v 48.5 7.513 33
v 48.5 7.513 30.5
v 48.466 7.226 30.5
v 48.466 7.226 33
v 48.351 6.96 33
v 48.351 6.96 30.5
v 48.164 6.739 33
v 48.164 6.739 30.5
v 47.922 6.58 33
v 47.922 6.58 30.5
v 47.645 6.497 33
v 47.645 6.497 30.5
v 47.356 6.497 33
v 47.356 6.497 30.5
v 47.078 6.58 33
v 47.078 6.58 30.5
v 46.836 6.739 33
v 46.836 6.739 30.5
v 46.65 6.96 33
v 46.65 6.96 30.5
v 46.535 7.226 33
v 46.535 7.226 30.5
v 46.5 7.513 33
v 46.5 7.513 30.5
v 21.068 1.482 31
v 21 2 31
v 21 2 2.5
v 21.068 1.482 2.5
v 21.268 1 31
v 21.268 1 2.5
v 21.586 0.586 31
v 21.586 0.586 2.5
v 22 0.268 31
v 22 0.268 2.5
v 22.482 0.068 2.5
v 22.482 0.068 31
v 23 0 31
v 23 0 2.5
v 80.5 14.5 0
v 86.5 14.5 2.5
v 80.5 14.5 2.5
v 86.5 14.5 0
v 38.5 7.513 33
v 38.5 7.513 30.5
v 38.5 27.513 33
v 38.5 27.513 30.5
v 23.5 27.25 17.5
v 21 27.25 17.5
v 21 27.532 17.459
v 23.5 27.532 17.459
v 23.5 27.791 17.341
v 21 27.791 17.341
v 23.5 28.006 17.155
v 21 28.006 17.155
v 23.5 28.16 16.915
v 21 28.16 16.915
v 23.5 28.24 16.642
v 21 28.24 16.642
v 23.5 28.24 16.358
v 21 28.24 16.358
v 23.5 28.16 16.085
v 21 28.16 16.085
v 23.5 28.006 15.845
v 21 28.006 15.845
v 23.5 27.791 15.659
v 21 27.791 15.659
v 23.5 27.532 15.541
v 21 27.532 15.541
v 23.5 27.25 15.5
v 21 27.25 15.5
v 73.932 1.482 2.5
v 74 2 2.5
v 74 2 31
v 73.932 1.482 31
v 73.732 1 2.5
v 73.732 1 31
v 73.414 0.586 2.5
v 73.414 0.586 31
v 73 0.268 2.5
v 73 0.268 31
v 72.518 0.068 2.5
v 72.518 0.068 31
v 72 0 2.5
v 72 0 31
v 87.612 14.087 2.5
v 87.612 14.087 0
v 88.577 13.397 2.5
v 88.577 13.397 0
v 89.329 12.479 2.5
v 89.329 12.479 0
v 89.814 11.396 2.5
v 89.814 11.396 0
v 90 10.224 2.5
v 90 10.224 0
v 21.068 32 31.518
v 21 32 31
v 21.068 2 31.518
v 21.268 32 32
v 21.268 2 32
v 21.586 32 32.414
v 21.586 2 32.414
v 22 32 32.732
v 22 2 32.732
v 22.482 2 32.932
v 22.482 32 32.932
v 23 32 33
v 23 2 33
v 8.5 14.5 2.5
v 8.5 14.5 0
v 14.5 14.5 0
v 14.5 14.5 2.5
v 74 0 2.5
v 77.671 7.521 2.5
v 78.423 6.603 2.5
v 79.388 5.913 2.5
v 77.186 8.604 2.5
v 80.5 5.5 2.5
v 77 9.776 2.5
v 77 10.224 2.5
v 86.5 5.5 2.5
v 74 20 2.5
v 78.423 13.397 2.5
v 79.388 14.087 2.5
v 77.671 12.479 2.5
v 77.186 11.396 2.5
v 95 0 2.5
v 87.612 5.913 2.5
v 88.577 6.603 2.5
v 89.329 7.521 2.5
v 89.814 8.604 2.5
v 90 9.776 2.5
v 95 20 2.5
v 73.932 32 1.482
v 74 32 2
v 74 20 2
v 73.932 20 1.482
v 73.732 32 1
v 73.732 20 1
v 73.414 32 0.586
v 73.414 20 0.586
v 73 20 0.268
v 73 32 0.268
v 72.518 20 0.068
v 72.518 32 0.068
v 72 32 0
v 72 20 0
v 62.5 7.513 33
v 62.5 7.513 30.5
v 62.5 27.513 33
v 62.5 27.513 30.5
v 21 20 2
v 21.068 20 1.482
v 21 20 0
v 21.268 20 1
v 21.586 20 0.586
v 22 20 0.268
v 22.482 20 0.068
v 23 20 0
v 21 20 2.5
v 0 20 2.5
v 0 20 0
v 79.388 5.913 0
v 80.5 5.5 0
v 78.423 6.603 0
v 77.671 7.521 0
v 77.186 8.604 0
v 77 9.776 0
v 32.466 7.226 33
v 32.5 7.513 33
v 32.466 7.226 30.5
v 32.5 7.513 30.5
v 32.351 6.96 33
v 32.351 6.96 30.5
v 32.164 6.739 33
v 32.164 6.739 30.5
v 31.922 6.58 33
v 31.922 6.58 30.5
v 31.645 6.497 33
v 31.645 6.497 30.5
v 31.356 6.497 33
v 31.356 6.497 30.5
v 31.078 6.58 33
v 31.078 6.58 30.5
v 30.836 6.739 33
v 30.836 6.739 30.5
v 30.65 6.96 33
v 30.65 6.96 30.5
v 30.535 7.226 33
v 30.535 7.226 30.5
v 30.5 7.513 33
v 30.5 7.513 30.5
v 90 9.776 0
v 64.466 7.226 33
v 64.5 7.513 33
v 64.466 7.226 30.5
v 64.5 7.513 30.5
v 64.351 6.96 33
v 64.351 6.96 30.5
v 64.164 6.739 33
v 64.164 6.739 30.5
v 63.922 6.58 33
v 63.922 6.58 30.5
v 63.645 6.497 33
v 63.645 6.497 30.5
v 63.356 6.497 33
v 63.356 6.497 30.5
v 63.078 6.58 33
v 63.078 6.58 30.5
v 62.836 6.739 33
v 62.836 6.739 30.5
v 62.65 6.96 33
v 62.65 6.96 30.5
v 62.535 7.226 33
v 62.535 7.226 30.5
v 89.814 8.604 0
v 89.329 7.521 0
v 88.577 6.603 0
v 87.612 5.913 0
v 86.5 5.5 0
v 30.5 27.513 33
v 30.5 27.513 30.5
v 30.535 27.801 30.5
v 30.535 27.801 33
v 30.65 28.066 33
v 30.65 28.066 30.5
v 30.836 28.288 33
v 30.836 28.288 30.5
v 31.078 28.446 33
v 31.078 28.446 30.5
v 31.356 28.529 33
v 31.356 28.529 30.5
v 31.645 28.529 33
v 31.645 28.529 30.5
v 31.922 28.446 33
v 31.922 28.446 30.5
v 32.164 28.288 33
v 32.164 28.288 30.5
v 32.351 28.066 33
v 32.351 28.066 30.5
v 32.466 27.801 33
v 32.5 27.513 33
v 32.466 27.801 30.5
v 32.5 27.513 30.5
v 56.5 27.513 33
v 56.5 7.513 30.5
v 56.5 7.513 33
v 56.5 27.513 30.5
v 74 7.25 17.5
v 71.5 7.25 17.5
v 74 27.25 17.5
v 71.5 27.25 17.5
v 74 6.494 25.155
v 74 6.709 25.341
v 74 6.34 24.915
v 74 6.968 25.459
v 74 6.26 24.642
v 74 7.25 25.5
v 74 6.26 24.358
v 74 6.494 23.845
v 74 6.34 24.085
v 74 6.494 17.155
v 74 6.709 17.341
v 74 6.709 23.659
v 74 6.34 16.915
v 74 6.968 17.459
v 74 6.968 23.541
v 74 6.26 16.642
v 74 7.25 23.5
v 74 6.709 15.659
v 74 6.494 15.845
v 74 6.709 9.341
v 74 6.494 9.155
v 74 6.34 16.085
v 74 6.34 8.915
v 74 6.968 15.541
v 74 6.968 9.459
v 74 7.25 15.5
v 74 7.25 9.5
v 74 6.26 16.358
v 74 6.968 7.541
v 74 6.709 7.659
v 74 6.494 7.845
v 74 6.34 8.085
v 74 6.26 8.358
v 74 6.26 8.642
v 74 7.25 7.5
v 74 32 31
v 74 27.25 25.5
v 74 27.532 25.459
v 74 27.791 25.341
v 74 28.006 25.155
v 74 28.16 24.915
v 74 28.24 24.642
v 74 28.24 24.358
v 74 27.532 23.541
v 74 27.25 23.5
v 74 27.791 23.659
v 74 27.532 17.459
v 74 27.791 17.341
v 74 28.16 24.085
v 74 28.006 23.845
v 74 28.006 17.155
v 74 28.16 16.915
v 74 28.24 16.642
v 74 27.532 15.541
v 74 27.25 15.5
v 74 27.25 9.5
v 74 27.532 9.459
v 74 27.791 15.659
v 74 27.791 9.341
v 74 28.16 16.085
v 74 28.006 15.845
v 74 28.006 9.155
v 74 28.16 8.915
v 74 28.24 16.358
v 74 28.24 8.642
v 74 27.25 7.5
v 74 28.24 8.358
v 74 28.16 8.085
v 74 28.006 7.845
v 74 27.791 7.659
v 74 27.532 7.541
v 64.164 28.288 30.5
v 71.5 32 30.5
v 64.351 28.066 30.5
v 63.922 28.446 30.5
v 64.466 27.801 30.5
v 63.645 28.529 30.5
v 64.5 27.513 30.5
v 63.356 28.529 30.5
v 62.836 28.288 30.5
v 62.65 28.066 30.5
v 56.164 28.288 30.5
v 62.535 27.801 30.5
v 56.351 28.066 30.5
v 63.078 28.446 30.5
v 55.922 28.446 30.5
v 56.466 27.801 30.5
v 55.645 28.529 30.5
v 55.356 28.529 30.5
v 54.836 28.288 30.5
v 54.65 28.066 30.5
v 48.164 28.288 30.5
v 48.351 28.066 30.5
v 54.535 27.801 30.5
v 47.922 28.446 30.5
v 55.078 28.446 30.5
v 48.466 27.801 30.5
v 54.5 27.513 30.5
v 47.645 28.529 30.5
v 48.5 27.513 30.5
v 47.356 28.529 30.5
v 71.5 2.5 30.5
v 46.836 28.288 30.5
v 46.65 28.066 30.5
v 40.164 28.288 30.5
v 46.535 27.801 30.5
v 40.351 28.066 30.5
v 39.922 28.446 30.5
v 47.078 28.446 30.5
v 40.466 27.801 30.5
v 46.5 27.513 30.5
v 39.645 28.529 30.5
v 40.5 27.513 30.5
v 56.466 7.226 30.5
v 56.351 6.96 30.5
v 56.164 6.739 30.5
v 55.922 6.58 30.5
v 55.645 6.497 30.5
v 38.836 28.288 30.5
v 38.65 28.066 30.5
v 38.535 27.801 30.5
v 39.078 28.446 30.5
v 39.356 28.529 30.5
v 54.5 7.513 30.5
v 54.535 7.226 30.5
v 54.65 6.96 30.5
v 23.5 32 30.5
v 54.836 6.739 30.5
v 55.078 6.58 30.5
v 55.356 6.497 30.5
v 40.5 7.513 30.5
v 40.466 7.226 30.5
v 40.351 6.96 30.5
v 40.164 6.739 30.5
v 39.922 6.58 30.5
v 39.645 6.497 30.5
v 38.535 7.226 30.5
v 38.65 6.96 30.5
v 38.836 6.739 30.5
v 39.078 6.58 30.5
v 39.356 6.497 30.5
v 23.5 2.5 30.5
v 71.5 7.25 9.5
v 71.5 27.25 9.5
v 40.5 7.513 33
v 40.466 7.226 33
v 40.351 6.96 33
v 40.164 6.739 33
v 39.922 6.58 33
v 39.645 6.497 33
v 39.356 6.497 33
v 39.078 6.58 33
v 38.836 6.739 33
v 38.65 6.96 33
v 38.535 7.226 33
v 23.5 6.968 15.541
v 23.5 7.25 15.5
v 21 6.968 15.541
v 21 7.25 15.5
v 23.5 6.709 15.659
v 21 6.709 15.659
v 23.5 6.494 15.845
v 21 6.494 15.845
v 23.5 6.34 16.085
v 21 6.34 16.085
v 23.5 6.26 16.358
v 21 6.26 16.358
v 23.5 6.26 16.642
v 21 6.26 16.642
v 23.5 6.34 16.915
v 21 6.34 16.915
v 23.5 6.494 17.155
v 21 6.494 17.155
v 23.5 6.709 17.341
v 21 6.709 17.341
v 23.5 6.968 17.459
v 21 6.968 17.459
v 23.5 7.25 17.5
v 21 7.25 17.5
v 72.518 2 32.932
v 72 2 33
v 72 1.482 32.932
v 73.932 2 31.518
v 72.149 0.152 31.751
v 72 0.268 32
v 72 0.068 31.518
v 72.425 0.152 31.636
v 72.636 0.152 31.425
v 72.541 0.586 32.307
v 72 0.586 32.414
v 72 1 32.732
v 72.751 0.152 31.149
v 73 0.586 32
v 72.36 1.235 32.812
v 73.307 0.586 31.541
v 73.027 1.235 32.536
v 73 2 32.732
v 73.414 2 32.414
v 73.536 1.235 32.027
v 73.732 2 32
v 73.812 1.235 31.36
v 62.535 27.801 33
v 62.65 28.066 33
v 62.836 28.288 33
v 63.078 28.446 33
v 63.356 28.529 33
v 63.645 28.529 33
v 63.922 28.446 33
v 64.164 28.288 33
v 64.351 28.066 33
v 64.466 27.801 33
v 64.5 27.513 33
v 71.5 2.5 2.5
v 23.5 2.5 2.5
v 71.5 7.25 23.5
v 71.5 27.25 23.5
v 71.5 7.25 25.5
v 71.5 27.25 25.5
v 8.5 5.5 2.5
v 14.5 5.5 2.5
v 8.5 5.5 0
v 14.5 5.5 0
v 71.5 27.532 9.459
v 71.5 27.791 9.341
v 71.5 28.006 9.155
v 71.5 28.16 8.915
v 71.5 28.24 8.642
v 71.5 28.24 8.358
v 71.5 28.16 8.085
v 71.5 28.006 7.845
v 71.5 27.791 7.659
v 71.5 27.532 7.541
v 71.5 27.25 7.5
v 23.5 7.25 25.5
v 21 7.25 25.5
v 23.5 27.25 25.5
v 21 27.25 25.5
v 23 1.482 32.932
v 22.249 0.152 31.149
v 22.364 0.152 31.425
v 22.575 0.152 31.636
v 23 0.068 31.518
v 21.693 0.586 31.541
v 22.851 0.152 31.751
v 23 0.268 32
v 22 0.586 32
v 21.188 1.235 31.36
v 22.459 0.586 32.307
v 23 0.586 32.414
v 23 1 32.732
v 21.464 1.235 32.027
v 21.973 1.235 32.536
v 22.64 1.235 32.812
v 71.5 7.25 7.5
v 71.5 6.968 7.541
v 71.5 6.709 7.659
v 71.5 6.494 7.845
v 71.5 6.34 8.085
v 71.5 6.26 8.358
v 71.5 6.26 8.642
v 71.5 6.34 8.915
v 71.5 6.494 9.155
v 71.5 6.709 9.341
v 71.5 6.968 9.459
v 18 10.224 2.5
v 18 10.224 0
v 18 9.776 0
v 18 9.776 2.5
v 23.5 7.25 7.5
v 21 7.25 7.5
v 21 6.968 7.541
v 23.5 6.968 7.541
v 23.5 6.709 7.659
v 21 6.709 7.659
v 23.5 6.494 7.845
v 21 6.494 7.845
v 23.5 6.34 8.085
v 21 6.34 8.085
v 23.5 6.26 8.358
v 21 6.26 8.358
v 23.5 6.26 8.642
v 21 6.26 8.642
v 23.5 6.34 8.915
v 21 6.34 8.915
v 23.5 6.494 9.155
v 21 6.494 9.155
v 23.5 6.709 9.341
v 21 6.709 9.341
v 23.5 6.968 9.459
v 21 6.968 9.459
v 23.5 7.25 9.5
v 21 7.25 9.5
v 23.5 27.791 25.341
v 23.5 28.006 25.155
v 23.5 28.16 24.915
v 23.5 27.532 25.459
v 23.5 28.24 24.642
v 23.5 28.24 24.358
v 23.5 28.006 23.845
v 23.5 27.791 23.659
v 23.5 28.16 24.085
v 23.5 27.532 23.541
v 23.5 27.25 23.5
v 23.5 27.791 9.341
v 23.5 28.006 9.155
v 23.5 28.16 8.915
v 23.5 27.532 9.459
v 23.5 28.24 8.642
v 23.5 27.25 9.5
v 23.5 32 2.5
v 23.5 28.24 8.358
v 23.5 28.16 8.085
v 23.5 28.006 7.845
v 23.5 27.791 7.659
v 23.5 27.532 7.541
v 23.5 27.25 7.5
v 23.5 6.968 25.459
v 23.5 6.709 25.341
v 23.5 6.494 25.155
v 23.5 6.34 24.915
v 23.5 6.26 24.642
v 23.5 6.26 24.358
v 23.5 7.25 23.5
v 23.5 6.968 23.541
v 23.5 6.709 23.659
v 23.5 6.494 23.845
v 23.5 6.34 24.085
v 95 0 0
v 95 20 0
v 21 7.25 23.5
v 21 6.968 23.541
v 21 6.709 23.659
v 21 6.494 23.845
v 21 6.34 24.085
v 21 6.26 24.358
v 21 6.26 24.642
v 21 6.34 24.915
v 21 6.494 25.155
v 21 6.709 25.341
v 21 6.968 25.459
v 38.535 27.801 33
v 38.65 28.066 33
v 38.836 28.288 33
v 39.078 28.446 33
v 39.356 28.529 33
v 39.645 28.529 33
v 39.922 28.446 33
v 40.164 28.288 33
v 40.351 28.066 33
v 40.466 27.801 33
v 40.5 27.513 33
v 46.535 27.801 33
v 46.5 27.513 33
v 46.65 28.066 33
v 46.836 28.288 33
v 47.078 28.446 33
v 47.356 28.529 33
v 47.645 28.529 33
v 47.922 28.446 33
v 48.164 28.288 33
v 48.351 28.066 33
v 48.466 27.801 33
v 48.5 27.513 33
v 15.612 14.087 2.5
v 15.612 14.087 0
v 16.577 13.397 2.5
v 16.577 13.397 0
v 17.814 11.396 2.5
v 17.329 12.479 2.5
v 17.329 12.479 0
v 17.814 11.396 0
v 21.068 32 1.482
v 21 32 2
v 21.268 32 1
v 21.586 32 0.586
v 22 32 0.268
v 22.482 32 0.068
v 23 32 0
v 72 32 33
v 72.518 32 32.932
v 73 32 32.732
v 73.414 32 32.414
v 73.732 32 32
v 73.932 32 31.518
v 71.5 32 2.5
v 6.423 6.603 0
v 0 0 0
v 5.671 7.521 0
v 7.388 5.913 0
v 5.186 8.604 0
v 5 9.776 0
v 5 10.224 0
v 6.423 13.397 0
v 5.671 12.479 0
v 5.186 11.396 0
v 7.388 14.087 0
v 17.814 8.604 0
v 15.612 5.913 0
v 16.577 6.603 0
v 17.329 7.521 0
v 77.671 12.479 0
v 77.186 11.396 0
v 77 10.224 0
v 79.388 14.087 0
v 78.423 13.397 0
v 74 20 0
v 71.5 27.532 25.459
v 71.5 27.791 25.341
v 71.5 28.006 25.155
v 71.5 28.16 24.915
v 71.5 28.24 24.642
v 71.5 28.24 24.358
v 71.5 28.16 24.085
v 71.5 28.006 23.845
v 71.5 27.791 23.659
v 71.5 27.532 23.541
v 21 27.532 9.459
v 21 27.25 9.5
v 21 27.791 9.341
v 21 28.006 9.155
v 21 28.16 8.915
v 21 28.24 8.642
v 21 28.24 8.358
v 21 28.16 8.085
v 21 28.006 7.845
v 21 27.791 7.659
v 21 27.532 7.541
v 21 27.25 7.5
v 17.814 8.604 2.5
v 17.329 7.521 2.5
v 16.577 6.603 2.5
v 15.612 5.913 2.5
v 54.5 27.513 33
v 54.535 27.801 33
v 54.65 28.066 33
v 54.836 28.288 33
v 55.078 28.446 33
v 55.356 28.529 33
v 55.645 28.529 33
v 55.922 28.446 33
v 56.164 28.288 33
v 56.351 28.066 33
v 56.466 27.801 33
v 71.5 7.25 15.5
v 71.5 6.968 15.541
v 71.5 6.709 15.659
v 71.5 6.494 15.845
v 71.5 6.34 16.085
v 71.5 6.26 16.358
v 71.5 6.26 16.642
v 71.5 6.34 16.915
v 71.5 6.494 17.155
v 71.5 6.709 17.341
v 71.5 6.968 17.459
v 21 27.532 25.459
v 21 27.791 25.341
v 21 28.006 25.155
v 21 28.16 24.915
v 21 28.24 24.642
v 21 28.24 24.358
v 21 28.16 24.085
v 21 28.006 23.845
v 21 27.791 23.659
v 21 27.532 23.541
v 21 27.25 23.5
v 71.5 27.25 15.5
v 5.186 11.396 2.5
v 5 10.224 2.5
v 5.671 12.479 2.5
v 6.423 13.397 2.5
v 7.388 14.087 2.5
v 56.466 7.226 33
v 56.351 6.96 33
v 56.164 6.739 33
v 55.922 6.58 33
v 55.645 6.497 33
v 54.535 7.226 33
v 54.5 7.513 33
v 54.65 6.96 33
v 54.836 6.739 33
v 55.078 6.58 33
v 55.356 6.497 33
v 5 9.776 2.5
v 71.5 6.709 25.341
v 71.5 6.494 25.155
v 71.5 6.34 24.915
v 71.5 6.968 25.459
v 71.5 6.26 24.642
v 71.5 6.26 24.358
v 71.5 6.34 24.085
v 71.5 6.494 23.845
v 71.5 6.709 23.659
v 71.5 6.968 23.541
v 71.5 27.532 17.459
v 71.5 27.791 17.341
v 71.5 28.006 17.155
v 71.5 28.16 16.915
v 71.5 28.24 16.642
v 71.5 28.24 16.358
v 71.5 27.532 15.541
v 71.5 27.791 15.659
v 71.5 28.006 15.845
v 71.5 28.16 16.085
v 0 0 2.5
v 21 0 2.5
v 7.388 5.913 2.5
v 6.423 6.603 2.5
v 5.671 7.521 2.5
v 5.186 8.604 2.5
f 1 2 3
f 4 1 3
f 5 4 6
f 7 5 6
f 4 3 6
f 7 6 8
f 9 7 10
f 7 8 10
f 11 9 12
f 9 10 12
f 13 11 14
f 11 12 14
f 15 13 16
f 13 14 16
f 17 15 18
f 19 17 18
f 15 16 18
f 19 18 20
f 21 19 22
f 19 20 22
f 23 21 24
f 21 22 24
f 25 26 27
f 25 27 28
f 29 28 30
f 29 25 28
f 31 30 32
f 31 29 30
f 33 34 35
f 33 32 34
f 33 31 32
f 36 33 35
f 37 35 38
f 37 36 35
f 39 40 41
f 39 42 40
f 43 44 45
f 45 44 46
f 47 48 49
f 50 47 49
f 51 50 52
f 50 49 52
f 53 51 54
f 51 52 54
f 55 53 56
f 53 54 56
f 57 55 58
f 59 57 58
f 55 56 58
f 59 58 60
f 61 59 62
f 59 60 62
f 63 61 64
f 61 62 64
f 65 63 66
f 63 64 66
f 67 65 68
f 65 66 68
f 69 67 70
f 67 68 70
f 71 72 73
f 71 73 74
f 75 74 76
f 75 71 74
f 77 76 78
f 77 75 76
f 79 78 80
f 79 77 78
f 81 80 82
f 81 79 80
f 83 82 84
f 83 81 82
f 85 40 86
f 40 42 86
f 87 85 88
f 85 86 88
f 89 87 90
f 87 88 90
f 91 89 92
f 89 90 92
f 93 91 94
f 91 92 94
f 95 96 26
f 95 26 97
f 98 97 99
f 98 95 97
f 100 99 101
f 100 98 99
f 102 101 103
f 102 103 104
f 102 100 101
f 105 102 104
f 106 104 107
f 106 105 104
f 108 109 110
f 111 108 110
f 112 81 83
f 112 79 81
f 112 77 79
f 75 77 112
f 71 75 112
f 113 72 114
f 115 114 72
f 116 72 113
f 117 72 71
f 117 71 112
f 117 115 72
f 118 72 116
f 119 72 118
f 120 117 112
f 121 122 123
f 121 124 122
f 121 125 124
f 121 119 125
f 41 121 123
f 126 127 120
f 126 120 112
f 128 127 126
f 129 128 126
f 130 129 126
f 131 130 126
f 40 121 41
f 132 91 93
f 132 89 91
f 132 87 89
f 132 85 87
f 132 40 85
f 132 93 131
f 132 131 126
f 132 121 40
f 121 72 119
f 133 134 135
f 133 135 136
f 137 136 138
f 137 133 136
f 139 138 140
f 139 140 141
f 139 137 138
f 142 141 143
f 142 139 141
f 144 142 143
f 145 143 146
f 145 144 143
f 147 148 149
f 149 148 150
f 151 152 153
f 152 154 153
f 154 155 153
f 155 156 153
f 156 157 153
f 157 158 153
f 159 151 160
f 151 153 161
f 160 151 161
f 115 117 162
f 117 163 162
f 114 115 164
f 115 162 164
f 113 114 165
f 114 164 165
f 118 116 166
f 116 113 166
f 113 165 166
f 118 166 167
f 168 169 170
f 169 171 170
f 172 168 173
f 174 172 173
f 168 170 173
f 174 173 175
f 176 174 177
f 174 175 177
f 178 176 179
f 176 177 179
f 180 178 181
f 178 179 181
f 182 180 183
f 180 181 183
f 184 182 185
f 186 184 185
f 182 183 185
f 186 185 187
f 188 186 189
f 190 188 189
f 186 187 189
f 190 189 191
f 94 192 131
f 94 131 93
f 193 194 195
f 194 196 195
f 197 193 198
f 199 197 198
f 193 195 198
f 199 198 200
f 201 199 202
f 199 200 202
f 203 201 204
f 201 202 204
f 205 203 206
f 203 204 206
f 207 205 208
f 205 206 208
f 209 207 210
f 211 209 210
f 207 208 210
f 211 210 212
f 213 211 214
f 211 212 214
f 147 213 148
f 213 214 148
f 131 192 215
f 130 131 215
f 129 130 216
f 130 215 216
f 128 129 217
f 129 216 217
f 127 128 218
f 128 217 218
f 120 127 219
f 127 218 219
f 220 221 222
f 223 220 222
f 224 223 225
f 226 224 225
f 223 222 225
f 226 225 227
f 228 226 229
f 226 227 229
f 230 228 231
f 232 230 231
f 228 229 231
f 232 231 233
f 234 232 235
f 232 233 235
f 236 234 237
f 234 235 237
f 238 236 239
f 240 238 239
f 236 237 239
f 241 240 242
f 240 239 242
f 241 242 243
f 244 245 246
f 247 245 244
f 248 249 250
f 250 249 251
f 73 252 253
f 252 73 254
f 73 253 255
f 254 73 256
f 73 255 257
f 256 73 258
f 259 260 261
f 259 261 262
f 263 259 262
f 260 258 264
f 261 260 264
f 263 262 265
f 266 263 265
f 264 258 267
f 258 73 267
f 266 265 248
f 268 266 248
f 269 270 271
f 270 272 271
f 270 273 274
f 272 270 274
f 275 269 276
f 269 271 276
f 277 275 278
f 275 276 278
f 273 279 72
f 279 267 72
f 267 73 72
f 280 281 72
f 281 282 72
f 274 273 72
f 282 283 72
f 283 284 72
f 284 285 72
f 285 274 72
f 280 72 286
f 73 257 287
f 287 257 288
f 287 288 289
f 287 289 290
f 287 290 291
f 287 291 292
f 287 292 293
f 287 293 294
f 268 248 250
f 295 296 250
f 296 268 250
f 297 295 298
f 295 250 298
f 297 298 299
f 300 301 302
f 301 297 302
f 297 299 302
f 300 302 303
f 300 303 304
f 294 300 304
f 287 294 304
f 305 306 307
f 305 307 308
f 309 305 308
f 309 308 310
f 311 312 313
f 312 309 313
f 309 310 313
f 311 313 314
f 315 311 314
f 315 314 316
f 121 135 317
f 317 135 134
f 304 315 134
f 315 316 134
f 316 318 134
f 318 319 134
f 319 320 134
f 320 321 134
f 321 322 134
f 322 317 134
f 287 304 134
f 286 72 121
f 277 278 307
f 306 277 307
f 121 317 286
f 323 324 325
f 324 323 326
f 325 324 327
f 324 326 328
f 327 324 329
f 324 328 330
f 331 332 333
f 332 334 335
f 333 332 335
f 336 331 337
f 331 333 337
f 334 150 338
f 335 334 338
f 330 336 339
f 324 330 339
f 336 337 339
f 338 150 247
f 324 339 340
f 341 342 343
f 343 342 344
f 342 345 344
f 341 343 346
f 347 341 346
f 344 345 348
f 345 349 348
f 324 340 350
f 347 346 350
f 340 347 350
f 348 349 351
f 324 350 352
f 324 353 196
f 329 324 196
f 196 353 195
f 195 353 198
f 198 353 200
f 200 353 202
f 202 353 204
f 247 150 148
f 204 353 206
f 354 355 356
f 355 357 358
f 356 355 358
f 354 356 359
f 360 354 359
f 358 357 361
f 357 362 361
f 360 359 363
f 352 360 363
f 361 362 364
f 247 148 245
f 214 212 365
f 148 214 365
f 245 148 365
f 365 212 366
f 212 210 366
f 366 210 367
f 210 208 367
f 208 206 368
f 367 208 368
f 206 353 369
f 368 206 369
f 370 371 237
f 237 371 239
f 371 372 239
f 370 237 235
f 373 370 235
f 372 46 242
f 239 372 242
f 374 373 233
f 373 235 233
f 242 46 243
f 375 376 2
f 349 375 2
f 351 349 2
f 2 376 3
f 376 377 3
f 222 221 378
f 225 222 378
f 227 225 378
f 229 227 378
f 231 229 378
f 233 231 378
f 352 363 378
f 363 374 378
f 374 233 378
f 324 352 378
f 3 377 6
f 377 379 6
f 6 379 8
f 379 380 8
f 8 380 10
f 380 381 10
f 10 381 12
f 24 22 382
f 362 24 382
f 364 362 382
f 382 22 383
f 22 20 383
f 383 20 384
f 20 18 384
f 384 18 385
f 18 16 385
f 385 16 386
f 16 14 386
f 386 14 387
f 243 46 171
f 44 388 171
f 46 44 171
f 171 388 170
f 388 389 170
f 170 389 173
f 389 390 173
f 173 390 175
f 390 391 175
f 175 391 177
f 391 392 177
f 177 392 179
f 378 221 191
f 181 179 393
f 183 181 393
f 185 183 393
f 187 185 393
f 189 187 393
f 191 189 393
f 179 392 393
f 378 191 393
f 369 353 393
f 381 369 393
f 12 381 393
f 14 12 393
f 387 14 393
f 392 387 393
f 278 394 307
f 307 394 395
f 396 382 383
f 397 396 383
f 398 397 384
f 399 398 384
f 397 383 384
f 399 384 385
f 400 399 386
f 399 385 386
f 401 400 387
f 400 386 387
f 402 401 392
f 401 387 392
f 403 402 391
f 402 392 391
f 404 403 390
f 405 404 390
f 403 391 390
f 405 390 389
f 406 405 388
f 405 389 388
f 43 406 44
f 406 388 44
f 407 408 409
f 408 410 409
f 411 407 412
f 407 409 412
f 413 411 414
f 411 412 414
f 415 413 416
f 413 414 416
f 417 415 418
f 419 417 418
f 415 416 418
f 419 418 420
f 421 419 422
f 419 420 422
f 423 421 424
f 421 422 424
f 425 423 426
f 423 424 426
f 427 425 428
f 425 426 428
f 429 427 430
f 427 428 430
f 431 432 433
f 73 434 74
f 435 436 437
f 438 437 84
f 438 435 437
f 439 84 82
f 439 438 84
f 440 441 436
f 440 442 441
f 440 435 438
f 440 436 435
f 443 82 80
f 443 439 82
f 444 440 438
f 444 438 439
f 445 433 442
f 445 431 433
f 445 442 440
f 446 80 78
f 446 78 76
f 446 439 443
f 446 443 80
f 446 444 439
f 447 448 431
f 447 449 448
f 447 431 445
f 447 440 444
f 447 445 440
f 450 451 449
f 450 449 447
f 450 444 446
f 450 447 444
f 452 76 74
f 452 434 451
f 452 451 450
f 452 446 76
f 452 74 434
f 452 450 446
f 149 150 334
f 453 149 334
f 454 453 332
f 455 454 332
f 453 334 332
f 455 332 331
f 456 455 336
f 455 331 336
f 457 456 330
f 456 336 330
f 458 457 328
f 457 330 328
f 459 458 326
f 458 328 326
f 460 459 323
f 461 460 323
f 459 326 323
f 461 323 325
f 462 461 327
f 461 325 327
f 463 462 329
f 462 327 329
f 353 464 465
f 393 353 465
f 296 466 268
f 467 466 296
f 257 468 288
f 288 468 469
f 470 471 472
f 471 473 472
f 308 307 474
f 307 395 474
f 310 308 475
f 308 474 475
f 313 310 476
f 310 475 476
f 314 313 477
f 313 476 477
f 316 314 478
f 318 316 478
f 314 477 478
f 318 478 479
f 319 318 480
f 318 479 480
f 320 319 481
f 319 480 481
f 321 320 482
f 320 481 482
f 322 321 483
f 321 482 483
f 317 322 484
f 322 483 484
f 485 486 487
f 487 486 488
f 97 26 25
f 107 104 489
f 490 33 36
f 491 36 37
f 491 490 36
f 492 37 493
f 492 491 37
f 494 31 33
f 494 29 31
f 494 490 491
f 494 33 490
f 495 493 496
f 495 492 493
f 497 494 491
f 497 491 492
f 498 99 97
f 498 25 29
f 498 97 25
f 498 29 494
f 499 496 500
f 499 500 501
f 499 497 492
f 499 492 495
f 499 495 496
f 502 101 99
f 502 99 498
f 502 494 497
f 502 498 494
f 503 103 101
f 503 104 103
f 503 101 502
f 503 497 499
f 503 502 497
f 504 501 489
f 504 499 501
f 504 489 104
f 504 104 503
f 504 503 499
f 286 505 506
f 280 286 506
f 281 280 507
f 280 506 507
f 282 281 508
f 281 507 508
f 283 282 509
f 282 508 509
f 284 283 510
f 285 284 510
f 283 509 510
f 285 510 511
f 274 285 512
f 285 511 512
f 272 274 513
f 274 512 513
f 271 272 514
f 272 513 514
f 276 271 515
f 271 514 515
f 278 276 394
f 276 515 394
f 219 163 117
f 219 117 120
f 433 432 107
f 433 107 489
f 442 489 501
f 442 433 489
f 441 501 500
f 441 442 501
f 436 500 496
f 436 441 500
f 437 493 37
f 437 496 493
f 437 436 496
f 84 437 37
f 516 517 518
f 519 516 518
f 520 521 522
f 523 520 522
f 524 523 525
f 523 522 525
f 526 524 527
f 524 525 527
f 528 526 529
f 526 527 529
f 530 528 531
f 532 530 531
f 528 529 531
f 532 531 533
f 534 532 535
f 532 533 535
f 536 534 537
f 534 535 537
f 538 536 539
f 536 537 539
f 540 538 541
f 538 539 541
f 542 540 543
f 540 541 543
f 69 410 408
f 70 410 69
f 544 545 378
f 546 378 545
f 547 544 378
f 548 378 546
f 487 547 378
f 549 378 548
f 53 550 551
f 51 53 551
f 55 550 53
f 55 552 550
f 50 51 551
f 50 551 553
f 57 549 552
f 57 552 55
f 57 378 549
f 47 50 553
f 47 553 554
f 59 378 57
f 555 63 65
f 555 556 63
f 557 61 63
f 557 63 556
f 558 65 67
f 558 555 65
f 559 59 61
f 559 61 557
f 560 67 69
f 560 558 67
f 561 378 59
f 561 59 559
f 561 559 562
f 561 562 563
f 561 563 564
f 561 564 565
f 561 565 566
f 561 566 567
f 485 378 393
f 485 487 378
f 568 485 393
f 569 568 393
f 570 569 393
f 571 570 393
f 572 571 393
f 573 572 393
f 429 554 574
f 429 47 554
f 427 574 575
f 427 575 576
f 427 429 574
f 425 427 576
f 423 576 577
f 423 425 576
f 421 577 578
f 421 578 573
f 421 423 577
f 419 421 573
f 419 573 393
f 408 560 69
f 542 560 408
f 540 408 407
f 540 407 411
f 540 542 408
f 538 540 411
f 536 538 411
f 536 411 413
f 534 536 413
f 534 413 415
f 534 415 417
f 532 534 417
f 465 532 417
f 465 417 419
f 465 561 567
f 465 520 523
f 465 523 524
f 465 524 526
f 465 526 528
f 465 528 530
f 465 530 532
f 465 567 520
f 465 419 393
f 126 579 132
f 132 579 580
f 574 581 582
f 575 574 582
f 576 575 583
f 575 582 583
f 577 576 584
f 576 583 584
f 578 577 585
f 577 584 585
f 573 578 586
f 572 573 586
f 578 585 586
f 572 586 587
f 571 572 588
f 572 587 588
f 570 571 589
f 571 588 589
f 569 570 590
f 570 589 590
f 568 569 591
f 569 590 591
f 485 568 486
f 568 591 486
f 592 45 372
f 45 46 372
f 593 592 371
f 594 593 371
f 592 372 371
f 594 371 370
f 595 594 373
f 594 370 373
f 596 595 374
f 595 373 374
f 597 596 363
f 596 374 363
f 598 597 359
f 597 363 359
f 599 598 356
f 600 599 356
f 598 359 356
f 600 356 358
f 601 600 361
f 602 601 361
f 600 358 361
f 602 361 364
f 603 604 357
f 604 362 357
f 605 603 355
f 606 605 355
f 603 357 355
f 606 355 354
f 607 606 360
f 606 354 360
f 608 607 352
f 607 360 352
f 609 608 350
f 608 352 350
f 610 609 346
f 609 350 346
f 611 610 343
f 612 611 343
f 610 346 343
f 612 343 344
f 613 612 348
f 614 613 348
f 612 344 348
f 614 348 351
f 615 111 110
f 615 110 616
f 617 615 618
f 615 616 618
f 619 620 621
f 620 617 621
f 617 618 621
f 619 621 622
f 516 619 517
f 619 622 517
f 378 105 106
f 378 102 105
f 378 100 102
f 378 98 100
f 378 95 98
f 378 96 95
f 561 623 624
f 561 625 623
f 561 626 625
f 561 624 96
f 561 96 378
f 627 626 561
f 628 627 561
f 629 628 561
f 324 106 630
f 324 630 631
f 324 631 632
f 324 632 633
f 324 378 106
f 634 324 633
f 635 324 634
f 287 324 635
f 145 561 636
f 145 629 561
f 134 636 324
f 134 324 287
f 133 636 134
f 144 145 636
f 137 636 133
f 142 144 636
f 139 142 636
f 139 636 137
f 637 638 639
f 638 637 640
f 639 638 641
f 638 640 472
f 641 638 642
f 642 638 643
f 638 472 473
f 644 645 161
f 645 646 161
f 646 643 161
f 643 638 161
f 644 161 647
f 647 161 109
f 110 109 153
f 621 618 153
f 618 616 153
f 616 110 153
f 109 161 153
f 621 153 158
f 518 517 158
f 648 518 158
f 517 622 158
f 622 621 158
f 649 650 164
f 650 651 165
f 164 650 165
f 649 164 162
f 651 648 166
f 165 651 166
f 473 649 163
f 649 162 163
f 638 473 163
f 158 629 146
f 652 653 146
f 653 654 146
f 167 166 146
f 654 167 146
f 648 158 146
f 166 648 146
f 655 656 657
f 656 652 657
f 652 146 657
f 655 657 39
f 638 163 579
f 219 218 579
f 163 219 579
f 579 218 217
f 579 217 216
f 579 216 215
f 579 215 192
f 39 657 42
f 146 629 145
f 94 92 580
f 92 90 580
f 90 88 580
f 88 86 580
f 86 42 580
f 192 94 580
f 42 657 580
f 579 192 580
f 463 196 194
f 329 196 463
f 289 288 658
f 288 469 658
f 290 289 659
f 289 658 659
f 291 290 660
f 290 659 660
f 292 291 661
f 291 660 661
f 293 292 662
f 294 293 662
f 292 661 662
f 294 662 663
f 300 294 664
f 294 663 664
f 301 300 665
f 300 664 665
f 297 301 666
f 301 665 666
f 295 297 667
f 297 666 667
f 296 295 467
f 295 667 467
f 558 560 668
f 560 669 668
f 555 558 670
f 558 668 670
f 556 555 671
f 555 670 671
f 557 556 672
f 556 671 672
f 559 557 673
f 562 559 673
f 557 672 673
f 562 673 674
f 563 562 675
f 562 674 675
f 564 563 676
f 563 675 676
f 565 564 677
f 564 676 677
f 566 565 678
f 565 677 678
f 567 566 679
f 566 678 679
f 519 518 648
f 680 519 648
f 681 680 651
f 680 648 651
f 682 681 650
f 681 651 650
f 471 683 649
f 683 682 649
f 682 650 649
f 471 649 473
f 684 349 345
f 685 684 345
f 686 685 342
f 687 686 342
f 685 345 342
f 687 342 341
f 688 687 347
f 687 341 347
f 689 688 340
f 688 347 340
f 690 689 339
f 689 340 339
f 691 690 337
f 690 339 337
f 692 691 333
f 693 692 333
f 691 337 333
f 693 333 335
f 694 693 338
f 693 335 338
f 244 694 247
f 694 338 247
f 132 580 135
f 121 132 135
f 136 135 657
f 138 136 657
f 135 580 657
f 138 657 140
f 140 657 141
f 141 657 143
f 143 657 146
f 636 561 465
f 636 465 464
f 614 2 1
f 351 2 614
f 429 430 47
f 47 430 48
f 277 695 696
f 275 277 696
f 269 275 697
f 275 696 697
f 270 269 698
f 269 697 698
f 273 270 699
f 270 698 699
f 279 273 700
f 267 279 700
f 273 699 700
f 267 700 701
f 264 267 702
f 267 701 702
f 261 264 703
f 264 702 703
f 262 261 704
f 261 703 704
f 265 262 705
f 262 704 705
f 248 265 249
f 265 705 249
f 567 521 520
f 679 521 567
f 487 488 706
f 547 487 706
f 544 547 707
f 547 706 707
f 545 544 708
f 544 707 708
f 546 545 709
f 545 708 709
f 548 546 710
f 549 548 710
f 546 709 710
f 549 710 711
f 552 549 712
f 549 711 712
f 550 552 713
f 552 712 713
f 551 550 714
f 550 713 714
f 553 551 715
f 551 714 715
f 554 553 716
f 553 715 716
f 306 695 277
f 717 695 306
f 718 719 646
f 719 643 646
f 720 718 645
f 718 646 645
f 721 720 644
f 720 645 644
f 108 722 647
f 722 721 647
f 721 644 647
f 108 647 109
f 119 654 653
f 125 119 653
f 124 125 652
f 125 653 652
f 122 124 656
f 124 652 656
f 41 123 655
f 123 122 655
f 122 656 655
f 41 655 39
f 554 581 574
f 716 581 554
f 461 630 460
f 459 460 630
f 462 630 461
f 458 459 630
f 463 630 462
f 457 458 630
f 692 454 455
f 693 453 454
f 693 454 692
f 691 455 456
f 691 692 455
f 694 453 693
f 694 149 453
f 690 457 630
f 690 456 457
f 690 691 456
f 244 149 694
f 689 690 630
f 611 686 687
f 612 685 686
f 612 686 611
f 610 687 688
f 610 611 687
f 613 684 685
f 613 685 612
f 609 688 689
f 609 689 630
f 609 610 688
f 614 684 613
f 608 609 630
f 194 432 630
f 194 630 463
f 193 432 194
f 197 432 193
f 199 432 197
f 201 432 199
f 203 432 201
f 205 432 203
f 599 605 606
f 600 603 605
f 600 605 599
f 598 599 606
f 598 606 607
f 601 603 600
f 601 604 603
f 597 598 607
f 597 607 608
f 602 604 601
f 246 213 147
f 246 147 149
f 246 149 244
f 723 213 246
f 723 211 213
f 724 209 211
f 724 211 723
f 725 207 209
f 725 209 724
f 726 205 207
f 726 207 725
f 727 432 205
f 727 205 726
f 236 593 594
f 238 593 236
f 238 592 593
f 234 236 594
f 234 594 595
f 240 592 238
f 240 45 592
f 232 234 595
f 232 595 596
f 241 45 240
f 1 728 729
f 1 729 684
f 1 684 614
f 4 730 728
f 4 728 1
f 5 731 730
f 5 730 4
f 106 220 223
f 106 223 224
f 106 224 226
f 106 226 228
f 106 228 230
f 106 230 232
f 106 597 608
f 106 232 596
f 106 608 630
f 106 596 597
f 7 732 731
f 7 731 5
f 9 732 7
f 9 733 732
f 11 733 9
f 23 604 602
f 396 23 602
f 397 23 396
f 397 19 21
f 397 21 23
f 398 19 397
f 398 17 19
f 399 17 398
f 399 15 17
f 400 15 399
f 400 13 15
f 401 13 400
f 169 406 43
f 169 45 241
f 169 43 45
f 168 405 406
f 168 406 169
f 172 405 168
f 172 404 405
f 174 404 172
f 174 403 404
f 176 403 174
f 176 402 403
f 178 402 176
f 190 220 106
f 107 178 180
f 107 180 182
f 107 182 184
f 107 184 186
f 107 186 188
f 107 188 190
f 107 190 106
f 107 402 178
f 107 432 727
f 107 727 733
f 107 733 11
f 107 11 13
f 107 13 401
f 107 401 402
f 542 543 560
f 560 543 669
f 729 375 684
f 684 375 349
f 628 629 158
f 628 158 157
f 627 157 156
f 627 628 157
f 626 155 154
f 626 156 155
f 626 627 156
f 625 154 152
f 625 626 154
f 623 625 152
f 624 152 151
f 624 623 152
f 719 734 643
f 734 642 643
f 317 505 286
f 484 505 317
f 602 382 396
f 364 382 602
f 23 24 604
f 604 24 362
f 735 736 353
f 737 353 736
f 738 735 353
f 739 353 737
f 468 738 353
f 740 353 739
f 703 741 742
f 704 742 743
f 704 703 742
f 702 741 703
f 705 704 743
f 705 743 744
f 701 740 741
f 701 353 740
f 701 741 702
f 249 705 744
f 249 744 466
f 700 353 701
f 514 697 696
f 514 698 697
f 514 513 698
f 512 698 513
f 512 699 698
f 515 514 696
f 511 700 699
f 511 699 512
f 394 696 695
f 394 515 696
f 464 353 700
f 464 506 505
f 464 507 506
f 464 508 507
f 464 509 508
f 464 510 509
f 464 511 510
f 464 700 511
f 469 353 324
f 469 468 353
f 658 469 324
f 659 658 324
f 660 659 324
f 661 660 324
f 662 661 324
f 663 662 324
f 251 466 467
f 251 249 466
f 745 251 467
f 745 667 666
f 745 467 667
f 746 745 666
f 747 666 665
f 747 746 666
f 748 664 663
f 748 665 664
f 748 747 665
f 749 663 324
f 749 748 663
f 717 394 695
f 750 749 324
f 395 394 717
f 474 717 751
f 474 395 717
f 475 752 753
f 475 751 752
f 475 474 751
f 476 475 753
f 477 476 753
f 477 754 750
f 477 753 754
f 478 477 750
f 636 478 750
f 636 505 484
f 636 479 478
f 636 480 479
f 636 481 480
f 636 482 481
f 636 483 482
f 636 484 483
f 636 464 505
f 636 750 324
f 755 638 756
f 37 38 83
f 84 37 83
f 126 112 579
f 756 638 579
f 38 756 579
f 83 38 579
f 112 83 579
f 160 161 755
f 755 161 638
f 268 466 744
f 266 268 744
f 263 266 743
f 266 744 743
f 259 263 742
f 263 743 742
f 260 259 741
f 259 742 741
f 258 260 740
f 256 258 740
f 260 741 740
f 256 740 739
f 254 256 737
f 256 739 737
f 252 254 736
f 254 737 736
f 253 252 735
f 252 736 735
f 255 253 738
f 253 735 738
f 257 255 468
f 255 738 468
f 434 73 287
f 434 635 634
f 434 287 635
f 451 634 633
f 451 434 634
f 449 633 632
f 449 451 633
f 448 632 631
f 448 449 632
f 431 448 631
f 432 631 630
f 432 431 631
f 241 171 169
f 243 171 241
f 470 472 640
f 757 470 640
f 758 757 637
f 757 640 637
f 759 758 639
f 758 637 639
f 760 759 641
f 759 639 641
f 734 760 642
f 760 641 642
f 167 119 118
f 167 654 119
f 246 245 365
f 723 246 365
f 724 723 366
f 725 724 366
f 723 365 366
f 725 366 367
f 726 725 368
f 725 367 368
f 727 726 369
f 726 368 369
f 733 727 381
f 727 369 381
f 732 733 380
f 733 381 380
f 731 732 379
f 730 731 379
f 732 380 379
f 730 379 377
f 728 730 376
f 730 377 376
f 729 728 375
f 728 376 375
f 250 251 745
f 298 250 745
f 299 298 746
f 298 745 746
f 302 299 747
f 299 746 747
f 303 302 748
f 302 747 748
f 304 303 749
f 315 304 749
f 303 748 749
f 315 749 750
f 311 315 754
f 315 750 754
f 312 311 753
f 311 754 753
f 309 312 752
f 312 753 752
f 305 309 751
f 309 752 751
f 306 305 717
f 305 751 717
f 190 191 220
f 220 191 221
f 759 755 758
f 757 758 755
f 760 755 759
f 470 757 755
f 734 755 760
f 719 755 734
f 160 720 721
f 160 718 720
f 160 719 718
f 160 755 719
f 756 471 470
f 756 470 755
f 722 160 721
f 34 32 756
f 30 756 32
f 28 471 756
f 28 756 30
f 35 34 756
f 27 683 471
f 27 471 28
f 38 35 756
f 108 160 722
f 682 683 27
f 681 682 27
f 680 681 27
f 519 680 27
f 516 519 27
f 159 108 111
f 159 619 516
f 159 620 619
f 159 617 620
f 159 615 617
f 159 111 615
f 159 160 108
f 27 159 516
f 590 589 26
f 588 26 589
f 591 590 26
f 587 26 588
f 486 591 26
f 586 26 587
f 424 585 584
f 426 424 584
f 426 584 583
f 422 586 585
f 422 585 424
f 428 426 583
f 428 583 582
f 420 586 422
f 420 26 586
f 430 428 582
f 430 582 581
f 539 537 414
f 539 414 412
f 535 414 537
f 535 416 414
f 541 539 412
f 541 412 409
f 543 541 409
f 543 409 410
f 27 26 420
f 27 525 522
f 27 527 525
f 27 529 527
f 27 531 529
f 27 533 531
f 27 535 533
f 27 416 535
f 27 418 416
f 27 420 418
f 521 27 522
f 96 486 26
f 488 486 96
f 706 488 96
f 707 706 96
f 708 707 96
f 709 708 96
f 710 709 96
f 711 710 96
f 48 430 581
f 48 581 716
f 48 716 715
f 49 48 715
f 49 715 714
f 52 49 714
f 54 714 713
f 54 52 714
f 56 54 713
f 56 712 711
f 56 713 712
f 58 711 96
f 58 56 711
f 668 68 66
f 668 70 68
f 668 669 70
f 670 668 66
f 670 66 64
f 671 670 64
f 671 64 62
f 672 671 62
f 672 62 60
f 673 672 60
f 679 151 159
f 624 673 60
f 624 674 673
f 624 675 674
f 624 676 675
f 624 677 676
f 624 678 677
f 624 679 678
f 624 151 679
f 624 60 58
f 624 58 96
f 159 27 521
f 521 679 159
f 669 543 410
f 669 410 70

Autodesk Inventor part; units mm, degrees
ref_plane "YZ Plane" through (0, 0, 0) normal (1, 0, 0) x (0, 1, 0)
ref_plane "XZ Plane" through (0, 0, 0) normal (0, 1, 0) x (-1, 0, 0)
ref_plane "XY Plane" through (0, 0, 0) normal (0, 0, 1) x (1, 0, 0)
sketch "Sketch1" plane through (0, 0, 0) normal (0, 0, 1) x (1, 0, 0)
  line L0 (0, 0) -> (95, 0)
  line L1 (95, 0) -> (95, 20)
  line L2 (95, 20) -> (0, 20)
  line L3 (0, 20) -> (0, 0)
  line L4 (8.5, 14.5) -> (14.5, 14.5)
  line L5 (18, 10.2244) -> (18, 9.7756)
  line L6 (14.5, 5.5) -> (8.5, 5.5)
  line L7 (5, 9.7756) -> (5, 10.2244)
  line L8 (11.5, 14.5) -> (8.5, 14.5)
  arc A0 (8.5, 14.5) -> (5, 10) centre (9.4986, 10.1122) ccw
  arc A1 (5, 10) -> (8.5, 5.5) centre (9.4986, 9.8878) ccw
  arc A2 (18, 10) -> (14.5, 14.5) centre (13.5014, 10.1122) ccw
  arc A3 (14.5, 5.5) -> (18, 10) centre (13.5014, 9.8878) ccw
  line L9 (86.5, 14.5) -> (80.5, 14.5)
  line L10 (77, 10.2244) -> (77, 9.7756)
  line L11 (80.5, 5.5) -> (86.5, 5.5)
  line L12 (90, 9.7756) -> (90, 10.2244)
  line L13 (83.5, 14.5) -> (86.5, 14.5)
  arc A4 (90, 10) -> (86.5, 14.5) centre (85.5014, 10.1122) ccw
  arc A5 (86.5, 5.5) -> (90, 10) centre (85.5014, 9.8878) ccw
  arc A6 (80.5, 14.5) -> (77, 10) centre (81.4986, 10.1122) ccw
  arc A7 (77, 10) -> (80.5, 5.5) centre (81.4986, 9.8878) ccw
  point P0 (47.5, 10)
  point P1 (11.5, 10)
  point P2 (83.5, 10)
  dimension "d0" = 95
  dimension "d1" = 20
extrude "Extrusion1" add sketch "Sketch1" along normal blind 2.5
sketch "Sketch2" plane through (0, 20, 0) normal (0, 1, 0) x (1, 0, 0)
  line L0 (0, 0) -> (95, 0) projected
  line L1 (47.5, 0) -> (21, 0)
  line L2 (47.5, 0) -> (74, 0) construction
  line L3 (47.5, 0) -> (74, 0)
  line L4 (47.5, 0) -> (74, 0) construction
  line L5 (74, 0) -> (74, -2.5)
  line L6 (0, -2.5) -> (95, -2.5) projected
  line L7 (21, 0) -> (21, -2.5)
  line L8 (21, -2.5) -> (74, -2.5)
extrude "Extrusion2" add sketch "Sketch2" along normal blind 12
sketch "Sketch3" plane through (0, 0, 2.5) normal (0, 0, 1) x (1, 0, 0)
  line L0 (74, 32) -> (21, 32) projected
  line L1 (0, 0) -> (95, 0) projected
  line L2 (21, 32) -> (23.5, 32)
  line L3 (23.5, 32) -> (23.5, 2.5)
  line L4 (23.5, 0) -> (21, 0)
  line L5 (21, 0) -> (21, 32)
  line L6 (74, 20) -> (74, 32) projected
  line L7 (74, 20) -> (74, 0)
  line L8 (74, 0) -> (71.5, 0)
  line L9 (71.5, 2.5) -> (71.5, 32)
  line L10 (71.5, 32) -> (74, 32)
  line L11 (74, 32) -> (74, 0)
  line L12 (23.5, 0) -> (71.5, 0)
  line L13 (71.5, 2.5) -> (23.5, 2.5)
extrude "Extrusion3" add sketch "Sketch3" along normal blind 30.5 contours L6 L7 L1 L5 L0 L3 L13 L9
sketch "Sketch4" plane through (23.5, 2.5, 2.5) normal (0, 1, 0) x (1, 0, 0)
  line L0 (48, -30.5) -> (0, -30.5) projected
  line L1 (48, 0) -> (48, -30.5) projected
  line L2 (0, -30.5) -> (48, -30.5)
  line L3 (48, -30.5) -> (48, -28)
  line L4 (48, -28) -> (0, -28)
  line L5 (0, -28) -> (0, -30.5)
  point P0 (-23.5, 2.5)
  dimension "d24" = 2.5
extrude "Extrusion4" add sketch "Sketch4" along normal up to surface (29.5 mm away)
sketch "Sketch5" plane through (23.5, 2.5, 2.5) normal (1, 0, 0) x (0, 0, -1)
  line L0 (0, 0) -> (-28, 0) projected
  line L1 (-14, 0) -> (-14, 29.5)
  line L2 (0, 29.5) -> (-28, 29.5) projected
  line L3 (-15, 14.75) -> (-15, 24.75)
  line L4 (-15, 14.75) -> (-15, 4.75)
  line L5 (-13, 14.75) -> (-13, 4.75)
  line L6 (-13, 14.75) -> (-13, 24.75)
  arc A0 (-13, 24.75) -> (-15, 24.75) centre (-14, 24.75) ccw
  arc A1 (-15, 4.75) -> (-13, 4.75) centre (-14, 4.75) ccw
  line L7 (-14, 14.75) -> (-14, 15.75)
  line L8 (-15, 14.75) -> (-13, 14.75)
  line L9 (-23, 14.75) -> (-23, 24.75)
  line L10 (-21, 14.75) -> (-21, 24.75)
  line L11 (-21, 14.75) -> (-21, 4.75)
  line L12 (-23, 14.75) -> (-23, 4.75)
  arc A2 (-23, 4.75) -> (-21, 4.75) centre (-22, 4.75) ccw
  arc A3 (-21, 24.75) -> (-23, 24.75) centre (-22, 24.75) ccw
  line L13 (-6, 14.75) -> (-6, 15.75)
  line L14 (-7, 14.75) -> (-7, 4.75)
  line L15 (-5, 14.75) -> (-5, 4.75)
  arc A4 (-7, 4.75) -> (-5, 4.75) centre (-6, 4.75) ccw
  line L16 (-7, 14.75) -> (-7, 24.75)
  line L17 (-5, 14.75) -> (-5, 24.75)
  arc A5 (-5, 24.75) -> (-7, 24.75) centre (-6, 24.75) ccw
  point P0 (2.5, -2.5)
  dimension "d38" = 8
  dimension "d45" = 8
extrude "Extrusion5" cut sketch "Sketch5" along normal through all both and the other way through all
sketch "Sketch8" plane through (71.5, 2.5, 30.5) normal (0, 0, -1) x (-1, 0, 0)
  line L0 (-2.5, 29.5) -> (50.5, 29.5) projected
  line L1 (48, 0) -> (0, 0) projected
  line L2 (24, 29.5) -> (53.5, 29.5) construction
  line L3 (23.9997, 15.0133) -> (24.9997, 15.0133) construction
  line L4 (22.9997, 15.0133) -> (22.9997, 25.0133)
  line L5 (22.9997, 15.0133) -> (22.9997, 5.0133)
  line L6 (24.9997, 15.0133) -> (24.9997, 5.0133)
  line L7 (24.9997, 15.0133) -> (24.9997, 25.0133)
  arc A0 (24.9997, 25.0133) -> (22.9997, 25.0133) centre (23.9997, 25.0393) ccw
  arc A1 (22.9997, 5.0133) -> (24.9997, 5.0133) centre (23.9997, 4.9873) ccw
  line L8 (30.9997, 15.0133) -> (30.9997, 25.0133)
  line L9 (30.9997, 15.0133) -> (30.9997, 5.0133)
  line L10 (32.9997, 15.0133) -> (32.9997, 5.0133)
  line L11 (32.9997, 15.0133) -> (32.9997, 25.0133)
  arc A2 (32.9997, 25.0133) -> (30.9997, 25.0133) centre (31.9997, 25.0393) ccw
  arc A3 (30.9997, 5.0133) -> (32.9997, 5.0133) centre (31.9997, 4.9873) ccw
  line L12 (38.9997, 15.0133) -> (38.9997, 25.0133)
  line L13 (38.9997, 15.0133) -> (38.9997, 5.0133)
  line L14 (40.9997, 15.0133) -> (40.9997, 5.0133)
  line L15 (40.9997, 15.0133) -> (40.9997, 25.0133)
  arc A4 (40.9997, 25.0133) -> (38.9997, 25.0133) centre (39.9997, 25.0393) ccw
  arc A5 (38.9997, 5.0133) -> (40.9997, 5.0133) centre (39.9997, 4.9873) ccw
  line L16 (14.9997, 15.0133) -> (14.9997, 25.0133)
  line L17 (16.9997, 15.0133) -> (16.9997, 25.0133)
  arc A6 (16.9997, 25.0133) -> (14.9997, 25.0133) centre (15.9997, 25.0393) ccw
  line L18 (14.9997, 15.0133) -> (14.9997, 5.0133)
  line L19 (16.9997, 15.0133) -> (16.9997, 5.0133)
  arc A7 (14.9997, 5.0133) -> (16.9997, 5.0133) centre (15.9997, 4.9873) ccw
  line L20 (6.9997, 15.0133) -> (6.9997, 25.0133)
  line L21 (8.9997, 15.0133) -> (8.9997, 25.0133)
  arc A8 (8.9997, 25.0133) -> (6.9997, 25.0133) centre (7.9997, 25.0393) ccw
  line L22 (6.9997, 15.0133) -> (6.9997, 5.0133)
  line L23 (8.9997, 15.0133) -> (8.9997, 5.0133)
  arc A9 (6.9997, 5.0133) -> (8.9997, 5.0133) centre (7.9997, 4.9873) ccw
  point P0 (71.5, -2.5)
  point P1 (31.9997, 15.0133)
  point P2 (39.9997, 15.0133)
  point P3 (15.9997, 15.0133)
  point P4 (22.9997, 25.0133)
  point P5 (24.9997, 25.0133)
  point P6 (7.9997, 15.0133)
  point P7 (14.9997, 25.0133)
  point P8 (15.9997, 25.0393)
  dimension "d64" = 8
  dimension "d71" = 8
extrude "Extrusion6" cut sketch "Sketch8" against normal up to surface (2.5 mm away)
fillet "Fillet1" radius 2 4 edges at (74, 16, 33) (21, 16, 33) (74, 26, 0) (21, 26, 0)
fillet "Fillet2" radius 2 5 edges at (73.4142, 0, 32.4142) (74, 0, 16.75) (21.5858, 0, 32.4142) (21, 0, 16.75) (47.5, 0, 33)
properties part number "SCDHolder3"
